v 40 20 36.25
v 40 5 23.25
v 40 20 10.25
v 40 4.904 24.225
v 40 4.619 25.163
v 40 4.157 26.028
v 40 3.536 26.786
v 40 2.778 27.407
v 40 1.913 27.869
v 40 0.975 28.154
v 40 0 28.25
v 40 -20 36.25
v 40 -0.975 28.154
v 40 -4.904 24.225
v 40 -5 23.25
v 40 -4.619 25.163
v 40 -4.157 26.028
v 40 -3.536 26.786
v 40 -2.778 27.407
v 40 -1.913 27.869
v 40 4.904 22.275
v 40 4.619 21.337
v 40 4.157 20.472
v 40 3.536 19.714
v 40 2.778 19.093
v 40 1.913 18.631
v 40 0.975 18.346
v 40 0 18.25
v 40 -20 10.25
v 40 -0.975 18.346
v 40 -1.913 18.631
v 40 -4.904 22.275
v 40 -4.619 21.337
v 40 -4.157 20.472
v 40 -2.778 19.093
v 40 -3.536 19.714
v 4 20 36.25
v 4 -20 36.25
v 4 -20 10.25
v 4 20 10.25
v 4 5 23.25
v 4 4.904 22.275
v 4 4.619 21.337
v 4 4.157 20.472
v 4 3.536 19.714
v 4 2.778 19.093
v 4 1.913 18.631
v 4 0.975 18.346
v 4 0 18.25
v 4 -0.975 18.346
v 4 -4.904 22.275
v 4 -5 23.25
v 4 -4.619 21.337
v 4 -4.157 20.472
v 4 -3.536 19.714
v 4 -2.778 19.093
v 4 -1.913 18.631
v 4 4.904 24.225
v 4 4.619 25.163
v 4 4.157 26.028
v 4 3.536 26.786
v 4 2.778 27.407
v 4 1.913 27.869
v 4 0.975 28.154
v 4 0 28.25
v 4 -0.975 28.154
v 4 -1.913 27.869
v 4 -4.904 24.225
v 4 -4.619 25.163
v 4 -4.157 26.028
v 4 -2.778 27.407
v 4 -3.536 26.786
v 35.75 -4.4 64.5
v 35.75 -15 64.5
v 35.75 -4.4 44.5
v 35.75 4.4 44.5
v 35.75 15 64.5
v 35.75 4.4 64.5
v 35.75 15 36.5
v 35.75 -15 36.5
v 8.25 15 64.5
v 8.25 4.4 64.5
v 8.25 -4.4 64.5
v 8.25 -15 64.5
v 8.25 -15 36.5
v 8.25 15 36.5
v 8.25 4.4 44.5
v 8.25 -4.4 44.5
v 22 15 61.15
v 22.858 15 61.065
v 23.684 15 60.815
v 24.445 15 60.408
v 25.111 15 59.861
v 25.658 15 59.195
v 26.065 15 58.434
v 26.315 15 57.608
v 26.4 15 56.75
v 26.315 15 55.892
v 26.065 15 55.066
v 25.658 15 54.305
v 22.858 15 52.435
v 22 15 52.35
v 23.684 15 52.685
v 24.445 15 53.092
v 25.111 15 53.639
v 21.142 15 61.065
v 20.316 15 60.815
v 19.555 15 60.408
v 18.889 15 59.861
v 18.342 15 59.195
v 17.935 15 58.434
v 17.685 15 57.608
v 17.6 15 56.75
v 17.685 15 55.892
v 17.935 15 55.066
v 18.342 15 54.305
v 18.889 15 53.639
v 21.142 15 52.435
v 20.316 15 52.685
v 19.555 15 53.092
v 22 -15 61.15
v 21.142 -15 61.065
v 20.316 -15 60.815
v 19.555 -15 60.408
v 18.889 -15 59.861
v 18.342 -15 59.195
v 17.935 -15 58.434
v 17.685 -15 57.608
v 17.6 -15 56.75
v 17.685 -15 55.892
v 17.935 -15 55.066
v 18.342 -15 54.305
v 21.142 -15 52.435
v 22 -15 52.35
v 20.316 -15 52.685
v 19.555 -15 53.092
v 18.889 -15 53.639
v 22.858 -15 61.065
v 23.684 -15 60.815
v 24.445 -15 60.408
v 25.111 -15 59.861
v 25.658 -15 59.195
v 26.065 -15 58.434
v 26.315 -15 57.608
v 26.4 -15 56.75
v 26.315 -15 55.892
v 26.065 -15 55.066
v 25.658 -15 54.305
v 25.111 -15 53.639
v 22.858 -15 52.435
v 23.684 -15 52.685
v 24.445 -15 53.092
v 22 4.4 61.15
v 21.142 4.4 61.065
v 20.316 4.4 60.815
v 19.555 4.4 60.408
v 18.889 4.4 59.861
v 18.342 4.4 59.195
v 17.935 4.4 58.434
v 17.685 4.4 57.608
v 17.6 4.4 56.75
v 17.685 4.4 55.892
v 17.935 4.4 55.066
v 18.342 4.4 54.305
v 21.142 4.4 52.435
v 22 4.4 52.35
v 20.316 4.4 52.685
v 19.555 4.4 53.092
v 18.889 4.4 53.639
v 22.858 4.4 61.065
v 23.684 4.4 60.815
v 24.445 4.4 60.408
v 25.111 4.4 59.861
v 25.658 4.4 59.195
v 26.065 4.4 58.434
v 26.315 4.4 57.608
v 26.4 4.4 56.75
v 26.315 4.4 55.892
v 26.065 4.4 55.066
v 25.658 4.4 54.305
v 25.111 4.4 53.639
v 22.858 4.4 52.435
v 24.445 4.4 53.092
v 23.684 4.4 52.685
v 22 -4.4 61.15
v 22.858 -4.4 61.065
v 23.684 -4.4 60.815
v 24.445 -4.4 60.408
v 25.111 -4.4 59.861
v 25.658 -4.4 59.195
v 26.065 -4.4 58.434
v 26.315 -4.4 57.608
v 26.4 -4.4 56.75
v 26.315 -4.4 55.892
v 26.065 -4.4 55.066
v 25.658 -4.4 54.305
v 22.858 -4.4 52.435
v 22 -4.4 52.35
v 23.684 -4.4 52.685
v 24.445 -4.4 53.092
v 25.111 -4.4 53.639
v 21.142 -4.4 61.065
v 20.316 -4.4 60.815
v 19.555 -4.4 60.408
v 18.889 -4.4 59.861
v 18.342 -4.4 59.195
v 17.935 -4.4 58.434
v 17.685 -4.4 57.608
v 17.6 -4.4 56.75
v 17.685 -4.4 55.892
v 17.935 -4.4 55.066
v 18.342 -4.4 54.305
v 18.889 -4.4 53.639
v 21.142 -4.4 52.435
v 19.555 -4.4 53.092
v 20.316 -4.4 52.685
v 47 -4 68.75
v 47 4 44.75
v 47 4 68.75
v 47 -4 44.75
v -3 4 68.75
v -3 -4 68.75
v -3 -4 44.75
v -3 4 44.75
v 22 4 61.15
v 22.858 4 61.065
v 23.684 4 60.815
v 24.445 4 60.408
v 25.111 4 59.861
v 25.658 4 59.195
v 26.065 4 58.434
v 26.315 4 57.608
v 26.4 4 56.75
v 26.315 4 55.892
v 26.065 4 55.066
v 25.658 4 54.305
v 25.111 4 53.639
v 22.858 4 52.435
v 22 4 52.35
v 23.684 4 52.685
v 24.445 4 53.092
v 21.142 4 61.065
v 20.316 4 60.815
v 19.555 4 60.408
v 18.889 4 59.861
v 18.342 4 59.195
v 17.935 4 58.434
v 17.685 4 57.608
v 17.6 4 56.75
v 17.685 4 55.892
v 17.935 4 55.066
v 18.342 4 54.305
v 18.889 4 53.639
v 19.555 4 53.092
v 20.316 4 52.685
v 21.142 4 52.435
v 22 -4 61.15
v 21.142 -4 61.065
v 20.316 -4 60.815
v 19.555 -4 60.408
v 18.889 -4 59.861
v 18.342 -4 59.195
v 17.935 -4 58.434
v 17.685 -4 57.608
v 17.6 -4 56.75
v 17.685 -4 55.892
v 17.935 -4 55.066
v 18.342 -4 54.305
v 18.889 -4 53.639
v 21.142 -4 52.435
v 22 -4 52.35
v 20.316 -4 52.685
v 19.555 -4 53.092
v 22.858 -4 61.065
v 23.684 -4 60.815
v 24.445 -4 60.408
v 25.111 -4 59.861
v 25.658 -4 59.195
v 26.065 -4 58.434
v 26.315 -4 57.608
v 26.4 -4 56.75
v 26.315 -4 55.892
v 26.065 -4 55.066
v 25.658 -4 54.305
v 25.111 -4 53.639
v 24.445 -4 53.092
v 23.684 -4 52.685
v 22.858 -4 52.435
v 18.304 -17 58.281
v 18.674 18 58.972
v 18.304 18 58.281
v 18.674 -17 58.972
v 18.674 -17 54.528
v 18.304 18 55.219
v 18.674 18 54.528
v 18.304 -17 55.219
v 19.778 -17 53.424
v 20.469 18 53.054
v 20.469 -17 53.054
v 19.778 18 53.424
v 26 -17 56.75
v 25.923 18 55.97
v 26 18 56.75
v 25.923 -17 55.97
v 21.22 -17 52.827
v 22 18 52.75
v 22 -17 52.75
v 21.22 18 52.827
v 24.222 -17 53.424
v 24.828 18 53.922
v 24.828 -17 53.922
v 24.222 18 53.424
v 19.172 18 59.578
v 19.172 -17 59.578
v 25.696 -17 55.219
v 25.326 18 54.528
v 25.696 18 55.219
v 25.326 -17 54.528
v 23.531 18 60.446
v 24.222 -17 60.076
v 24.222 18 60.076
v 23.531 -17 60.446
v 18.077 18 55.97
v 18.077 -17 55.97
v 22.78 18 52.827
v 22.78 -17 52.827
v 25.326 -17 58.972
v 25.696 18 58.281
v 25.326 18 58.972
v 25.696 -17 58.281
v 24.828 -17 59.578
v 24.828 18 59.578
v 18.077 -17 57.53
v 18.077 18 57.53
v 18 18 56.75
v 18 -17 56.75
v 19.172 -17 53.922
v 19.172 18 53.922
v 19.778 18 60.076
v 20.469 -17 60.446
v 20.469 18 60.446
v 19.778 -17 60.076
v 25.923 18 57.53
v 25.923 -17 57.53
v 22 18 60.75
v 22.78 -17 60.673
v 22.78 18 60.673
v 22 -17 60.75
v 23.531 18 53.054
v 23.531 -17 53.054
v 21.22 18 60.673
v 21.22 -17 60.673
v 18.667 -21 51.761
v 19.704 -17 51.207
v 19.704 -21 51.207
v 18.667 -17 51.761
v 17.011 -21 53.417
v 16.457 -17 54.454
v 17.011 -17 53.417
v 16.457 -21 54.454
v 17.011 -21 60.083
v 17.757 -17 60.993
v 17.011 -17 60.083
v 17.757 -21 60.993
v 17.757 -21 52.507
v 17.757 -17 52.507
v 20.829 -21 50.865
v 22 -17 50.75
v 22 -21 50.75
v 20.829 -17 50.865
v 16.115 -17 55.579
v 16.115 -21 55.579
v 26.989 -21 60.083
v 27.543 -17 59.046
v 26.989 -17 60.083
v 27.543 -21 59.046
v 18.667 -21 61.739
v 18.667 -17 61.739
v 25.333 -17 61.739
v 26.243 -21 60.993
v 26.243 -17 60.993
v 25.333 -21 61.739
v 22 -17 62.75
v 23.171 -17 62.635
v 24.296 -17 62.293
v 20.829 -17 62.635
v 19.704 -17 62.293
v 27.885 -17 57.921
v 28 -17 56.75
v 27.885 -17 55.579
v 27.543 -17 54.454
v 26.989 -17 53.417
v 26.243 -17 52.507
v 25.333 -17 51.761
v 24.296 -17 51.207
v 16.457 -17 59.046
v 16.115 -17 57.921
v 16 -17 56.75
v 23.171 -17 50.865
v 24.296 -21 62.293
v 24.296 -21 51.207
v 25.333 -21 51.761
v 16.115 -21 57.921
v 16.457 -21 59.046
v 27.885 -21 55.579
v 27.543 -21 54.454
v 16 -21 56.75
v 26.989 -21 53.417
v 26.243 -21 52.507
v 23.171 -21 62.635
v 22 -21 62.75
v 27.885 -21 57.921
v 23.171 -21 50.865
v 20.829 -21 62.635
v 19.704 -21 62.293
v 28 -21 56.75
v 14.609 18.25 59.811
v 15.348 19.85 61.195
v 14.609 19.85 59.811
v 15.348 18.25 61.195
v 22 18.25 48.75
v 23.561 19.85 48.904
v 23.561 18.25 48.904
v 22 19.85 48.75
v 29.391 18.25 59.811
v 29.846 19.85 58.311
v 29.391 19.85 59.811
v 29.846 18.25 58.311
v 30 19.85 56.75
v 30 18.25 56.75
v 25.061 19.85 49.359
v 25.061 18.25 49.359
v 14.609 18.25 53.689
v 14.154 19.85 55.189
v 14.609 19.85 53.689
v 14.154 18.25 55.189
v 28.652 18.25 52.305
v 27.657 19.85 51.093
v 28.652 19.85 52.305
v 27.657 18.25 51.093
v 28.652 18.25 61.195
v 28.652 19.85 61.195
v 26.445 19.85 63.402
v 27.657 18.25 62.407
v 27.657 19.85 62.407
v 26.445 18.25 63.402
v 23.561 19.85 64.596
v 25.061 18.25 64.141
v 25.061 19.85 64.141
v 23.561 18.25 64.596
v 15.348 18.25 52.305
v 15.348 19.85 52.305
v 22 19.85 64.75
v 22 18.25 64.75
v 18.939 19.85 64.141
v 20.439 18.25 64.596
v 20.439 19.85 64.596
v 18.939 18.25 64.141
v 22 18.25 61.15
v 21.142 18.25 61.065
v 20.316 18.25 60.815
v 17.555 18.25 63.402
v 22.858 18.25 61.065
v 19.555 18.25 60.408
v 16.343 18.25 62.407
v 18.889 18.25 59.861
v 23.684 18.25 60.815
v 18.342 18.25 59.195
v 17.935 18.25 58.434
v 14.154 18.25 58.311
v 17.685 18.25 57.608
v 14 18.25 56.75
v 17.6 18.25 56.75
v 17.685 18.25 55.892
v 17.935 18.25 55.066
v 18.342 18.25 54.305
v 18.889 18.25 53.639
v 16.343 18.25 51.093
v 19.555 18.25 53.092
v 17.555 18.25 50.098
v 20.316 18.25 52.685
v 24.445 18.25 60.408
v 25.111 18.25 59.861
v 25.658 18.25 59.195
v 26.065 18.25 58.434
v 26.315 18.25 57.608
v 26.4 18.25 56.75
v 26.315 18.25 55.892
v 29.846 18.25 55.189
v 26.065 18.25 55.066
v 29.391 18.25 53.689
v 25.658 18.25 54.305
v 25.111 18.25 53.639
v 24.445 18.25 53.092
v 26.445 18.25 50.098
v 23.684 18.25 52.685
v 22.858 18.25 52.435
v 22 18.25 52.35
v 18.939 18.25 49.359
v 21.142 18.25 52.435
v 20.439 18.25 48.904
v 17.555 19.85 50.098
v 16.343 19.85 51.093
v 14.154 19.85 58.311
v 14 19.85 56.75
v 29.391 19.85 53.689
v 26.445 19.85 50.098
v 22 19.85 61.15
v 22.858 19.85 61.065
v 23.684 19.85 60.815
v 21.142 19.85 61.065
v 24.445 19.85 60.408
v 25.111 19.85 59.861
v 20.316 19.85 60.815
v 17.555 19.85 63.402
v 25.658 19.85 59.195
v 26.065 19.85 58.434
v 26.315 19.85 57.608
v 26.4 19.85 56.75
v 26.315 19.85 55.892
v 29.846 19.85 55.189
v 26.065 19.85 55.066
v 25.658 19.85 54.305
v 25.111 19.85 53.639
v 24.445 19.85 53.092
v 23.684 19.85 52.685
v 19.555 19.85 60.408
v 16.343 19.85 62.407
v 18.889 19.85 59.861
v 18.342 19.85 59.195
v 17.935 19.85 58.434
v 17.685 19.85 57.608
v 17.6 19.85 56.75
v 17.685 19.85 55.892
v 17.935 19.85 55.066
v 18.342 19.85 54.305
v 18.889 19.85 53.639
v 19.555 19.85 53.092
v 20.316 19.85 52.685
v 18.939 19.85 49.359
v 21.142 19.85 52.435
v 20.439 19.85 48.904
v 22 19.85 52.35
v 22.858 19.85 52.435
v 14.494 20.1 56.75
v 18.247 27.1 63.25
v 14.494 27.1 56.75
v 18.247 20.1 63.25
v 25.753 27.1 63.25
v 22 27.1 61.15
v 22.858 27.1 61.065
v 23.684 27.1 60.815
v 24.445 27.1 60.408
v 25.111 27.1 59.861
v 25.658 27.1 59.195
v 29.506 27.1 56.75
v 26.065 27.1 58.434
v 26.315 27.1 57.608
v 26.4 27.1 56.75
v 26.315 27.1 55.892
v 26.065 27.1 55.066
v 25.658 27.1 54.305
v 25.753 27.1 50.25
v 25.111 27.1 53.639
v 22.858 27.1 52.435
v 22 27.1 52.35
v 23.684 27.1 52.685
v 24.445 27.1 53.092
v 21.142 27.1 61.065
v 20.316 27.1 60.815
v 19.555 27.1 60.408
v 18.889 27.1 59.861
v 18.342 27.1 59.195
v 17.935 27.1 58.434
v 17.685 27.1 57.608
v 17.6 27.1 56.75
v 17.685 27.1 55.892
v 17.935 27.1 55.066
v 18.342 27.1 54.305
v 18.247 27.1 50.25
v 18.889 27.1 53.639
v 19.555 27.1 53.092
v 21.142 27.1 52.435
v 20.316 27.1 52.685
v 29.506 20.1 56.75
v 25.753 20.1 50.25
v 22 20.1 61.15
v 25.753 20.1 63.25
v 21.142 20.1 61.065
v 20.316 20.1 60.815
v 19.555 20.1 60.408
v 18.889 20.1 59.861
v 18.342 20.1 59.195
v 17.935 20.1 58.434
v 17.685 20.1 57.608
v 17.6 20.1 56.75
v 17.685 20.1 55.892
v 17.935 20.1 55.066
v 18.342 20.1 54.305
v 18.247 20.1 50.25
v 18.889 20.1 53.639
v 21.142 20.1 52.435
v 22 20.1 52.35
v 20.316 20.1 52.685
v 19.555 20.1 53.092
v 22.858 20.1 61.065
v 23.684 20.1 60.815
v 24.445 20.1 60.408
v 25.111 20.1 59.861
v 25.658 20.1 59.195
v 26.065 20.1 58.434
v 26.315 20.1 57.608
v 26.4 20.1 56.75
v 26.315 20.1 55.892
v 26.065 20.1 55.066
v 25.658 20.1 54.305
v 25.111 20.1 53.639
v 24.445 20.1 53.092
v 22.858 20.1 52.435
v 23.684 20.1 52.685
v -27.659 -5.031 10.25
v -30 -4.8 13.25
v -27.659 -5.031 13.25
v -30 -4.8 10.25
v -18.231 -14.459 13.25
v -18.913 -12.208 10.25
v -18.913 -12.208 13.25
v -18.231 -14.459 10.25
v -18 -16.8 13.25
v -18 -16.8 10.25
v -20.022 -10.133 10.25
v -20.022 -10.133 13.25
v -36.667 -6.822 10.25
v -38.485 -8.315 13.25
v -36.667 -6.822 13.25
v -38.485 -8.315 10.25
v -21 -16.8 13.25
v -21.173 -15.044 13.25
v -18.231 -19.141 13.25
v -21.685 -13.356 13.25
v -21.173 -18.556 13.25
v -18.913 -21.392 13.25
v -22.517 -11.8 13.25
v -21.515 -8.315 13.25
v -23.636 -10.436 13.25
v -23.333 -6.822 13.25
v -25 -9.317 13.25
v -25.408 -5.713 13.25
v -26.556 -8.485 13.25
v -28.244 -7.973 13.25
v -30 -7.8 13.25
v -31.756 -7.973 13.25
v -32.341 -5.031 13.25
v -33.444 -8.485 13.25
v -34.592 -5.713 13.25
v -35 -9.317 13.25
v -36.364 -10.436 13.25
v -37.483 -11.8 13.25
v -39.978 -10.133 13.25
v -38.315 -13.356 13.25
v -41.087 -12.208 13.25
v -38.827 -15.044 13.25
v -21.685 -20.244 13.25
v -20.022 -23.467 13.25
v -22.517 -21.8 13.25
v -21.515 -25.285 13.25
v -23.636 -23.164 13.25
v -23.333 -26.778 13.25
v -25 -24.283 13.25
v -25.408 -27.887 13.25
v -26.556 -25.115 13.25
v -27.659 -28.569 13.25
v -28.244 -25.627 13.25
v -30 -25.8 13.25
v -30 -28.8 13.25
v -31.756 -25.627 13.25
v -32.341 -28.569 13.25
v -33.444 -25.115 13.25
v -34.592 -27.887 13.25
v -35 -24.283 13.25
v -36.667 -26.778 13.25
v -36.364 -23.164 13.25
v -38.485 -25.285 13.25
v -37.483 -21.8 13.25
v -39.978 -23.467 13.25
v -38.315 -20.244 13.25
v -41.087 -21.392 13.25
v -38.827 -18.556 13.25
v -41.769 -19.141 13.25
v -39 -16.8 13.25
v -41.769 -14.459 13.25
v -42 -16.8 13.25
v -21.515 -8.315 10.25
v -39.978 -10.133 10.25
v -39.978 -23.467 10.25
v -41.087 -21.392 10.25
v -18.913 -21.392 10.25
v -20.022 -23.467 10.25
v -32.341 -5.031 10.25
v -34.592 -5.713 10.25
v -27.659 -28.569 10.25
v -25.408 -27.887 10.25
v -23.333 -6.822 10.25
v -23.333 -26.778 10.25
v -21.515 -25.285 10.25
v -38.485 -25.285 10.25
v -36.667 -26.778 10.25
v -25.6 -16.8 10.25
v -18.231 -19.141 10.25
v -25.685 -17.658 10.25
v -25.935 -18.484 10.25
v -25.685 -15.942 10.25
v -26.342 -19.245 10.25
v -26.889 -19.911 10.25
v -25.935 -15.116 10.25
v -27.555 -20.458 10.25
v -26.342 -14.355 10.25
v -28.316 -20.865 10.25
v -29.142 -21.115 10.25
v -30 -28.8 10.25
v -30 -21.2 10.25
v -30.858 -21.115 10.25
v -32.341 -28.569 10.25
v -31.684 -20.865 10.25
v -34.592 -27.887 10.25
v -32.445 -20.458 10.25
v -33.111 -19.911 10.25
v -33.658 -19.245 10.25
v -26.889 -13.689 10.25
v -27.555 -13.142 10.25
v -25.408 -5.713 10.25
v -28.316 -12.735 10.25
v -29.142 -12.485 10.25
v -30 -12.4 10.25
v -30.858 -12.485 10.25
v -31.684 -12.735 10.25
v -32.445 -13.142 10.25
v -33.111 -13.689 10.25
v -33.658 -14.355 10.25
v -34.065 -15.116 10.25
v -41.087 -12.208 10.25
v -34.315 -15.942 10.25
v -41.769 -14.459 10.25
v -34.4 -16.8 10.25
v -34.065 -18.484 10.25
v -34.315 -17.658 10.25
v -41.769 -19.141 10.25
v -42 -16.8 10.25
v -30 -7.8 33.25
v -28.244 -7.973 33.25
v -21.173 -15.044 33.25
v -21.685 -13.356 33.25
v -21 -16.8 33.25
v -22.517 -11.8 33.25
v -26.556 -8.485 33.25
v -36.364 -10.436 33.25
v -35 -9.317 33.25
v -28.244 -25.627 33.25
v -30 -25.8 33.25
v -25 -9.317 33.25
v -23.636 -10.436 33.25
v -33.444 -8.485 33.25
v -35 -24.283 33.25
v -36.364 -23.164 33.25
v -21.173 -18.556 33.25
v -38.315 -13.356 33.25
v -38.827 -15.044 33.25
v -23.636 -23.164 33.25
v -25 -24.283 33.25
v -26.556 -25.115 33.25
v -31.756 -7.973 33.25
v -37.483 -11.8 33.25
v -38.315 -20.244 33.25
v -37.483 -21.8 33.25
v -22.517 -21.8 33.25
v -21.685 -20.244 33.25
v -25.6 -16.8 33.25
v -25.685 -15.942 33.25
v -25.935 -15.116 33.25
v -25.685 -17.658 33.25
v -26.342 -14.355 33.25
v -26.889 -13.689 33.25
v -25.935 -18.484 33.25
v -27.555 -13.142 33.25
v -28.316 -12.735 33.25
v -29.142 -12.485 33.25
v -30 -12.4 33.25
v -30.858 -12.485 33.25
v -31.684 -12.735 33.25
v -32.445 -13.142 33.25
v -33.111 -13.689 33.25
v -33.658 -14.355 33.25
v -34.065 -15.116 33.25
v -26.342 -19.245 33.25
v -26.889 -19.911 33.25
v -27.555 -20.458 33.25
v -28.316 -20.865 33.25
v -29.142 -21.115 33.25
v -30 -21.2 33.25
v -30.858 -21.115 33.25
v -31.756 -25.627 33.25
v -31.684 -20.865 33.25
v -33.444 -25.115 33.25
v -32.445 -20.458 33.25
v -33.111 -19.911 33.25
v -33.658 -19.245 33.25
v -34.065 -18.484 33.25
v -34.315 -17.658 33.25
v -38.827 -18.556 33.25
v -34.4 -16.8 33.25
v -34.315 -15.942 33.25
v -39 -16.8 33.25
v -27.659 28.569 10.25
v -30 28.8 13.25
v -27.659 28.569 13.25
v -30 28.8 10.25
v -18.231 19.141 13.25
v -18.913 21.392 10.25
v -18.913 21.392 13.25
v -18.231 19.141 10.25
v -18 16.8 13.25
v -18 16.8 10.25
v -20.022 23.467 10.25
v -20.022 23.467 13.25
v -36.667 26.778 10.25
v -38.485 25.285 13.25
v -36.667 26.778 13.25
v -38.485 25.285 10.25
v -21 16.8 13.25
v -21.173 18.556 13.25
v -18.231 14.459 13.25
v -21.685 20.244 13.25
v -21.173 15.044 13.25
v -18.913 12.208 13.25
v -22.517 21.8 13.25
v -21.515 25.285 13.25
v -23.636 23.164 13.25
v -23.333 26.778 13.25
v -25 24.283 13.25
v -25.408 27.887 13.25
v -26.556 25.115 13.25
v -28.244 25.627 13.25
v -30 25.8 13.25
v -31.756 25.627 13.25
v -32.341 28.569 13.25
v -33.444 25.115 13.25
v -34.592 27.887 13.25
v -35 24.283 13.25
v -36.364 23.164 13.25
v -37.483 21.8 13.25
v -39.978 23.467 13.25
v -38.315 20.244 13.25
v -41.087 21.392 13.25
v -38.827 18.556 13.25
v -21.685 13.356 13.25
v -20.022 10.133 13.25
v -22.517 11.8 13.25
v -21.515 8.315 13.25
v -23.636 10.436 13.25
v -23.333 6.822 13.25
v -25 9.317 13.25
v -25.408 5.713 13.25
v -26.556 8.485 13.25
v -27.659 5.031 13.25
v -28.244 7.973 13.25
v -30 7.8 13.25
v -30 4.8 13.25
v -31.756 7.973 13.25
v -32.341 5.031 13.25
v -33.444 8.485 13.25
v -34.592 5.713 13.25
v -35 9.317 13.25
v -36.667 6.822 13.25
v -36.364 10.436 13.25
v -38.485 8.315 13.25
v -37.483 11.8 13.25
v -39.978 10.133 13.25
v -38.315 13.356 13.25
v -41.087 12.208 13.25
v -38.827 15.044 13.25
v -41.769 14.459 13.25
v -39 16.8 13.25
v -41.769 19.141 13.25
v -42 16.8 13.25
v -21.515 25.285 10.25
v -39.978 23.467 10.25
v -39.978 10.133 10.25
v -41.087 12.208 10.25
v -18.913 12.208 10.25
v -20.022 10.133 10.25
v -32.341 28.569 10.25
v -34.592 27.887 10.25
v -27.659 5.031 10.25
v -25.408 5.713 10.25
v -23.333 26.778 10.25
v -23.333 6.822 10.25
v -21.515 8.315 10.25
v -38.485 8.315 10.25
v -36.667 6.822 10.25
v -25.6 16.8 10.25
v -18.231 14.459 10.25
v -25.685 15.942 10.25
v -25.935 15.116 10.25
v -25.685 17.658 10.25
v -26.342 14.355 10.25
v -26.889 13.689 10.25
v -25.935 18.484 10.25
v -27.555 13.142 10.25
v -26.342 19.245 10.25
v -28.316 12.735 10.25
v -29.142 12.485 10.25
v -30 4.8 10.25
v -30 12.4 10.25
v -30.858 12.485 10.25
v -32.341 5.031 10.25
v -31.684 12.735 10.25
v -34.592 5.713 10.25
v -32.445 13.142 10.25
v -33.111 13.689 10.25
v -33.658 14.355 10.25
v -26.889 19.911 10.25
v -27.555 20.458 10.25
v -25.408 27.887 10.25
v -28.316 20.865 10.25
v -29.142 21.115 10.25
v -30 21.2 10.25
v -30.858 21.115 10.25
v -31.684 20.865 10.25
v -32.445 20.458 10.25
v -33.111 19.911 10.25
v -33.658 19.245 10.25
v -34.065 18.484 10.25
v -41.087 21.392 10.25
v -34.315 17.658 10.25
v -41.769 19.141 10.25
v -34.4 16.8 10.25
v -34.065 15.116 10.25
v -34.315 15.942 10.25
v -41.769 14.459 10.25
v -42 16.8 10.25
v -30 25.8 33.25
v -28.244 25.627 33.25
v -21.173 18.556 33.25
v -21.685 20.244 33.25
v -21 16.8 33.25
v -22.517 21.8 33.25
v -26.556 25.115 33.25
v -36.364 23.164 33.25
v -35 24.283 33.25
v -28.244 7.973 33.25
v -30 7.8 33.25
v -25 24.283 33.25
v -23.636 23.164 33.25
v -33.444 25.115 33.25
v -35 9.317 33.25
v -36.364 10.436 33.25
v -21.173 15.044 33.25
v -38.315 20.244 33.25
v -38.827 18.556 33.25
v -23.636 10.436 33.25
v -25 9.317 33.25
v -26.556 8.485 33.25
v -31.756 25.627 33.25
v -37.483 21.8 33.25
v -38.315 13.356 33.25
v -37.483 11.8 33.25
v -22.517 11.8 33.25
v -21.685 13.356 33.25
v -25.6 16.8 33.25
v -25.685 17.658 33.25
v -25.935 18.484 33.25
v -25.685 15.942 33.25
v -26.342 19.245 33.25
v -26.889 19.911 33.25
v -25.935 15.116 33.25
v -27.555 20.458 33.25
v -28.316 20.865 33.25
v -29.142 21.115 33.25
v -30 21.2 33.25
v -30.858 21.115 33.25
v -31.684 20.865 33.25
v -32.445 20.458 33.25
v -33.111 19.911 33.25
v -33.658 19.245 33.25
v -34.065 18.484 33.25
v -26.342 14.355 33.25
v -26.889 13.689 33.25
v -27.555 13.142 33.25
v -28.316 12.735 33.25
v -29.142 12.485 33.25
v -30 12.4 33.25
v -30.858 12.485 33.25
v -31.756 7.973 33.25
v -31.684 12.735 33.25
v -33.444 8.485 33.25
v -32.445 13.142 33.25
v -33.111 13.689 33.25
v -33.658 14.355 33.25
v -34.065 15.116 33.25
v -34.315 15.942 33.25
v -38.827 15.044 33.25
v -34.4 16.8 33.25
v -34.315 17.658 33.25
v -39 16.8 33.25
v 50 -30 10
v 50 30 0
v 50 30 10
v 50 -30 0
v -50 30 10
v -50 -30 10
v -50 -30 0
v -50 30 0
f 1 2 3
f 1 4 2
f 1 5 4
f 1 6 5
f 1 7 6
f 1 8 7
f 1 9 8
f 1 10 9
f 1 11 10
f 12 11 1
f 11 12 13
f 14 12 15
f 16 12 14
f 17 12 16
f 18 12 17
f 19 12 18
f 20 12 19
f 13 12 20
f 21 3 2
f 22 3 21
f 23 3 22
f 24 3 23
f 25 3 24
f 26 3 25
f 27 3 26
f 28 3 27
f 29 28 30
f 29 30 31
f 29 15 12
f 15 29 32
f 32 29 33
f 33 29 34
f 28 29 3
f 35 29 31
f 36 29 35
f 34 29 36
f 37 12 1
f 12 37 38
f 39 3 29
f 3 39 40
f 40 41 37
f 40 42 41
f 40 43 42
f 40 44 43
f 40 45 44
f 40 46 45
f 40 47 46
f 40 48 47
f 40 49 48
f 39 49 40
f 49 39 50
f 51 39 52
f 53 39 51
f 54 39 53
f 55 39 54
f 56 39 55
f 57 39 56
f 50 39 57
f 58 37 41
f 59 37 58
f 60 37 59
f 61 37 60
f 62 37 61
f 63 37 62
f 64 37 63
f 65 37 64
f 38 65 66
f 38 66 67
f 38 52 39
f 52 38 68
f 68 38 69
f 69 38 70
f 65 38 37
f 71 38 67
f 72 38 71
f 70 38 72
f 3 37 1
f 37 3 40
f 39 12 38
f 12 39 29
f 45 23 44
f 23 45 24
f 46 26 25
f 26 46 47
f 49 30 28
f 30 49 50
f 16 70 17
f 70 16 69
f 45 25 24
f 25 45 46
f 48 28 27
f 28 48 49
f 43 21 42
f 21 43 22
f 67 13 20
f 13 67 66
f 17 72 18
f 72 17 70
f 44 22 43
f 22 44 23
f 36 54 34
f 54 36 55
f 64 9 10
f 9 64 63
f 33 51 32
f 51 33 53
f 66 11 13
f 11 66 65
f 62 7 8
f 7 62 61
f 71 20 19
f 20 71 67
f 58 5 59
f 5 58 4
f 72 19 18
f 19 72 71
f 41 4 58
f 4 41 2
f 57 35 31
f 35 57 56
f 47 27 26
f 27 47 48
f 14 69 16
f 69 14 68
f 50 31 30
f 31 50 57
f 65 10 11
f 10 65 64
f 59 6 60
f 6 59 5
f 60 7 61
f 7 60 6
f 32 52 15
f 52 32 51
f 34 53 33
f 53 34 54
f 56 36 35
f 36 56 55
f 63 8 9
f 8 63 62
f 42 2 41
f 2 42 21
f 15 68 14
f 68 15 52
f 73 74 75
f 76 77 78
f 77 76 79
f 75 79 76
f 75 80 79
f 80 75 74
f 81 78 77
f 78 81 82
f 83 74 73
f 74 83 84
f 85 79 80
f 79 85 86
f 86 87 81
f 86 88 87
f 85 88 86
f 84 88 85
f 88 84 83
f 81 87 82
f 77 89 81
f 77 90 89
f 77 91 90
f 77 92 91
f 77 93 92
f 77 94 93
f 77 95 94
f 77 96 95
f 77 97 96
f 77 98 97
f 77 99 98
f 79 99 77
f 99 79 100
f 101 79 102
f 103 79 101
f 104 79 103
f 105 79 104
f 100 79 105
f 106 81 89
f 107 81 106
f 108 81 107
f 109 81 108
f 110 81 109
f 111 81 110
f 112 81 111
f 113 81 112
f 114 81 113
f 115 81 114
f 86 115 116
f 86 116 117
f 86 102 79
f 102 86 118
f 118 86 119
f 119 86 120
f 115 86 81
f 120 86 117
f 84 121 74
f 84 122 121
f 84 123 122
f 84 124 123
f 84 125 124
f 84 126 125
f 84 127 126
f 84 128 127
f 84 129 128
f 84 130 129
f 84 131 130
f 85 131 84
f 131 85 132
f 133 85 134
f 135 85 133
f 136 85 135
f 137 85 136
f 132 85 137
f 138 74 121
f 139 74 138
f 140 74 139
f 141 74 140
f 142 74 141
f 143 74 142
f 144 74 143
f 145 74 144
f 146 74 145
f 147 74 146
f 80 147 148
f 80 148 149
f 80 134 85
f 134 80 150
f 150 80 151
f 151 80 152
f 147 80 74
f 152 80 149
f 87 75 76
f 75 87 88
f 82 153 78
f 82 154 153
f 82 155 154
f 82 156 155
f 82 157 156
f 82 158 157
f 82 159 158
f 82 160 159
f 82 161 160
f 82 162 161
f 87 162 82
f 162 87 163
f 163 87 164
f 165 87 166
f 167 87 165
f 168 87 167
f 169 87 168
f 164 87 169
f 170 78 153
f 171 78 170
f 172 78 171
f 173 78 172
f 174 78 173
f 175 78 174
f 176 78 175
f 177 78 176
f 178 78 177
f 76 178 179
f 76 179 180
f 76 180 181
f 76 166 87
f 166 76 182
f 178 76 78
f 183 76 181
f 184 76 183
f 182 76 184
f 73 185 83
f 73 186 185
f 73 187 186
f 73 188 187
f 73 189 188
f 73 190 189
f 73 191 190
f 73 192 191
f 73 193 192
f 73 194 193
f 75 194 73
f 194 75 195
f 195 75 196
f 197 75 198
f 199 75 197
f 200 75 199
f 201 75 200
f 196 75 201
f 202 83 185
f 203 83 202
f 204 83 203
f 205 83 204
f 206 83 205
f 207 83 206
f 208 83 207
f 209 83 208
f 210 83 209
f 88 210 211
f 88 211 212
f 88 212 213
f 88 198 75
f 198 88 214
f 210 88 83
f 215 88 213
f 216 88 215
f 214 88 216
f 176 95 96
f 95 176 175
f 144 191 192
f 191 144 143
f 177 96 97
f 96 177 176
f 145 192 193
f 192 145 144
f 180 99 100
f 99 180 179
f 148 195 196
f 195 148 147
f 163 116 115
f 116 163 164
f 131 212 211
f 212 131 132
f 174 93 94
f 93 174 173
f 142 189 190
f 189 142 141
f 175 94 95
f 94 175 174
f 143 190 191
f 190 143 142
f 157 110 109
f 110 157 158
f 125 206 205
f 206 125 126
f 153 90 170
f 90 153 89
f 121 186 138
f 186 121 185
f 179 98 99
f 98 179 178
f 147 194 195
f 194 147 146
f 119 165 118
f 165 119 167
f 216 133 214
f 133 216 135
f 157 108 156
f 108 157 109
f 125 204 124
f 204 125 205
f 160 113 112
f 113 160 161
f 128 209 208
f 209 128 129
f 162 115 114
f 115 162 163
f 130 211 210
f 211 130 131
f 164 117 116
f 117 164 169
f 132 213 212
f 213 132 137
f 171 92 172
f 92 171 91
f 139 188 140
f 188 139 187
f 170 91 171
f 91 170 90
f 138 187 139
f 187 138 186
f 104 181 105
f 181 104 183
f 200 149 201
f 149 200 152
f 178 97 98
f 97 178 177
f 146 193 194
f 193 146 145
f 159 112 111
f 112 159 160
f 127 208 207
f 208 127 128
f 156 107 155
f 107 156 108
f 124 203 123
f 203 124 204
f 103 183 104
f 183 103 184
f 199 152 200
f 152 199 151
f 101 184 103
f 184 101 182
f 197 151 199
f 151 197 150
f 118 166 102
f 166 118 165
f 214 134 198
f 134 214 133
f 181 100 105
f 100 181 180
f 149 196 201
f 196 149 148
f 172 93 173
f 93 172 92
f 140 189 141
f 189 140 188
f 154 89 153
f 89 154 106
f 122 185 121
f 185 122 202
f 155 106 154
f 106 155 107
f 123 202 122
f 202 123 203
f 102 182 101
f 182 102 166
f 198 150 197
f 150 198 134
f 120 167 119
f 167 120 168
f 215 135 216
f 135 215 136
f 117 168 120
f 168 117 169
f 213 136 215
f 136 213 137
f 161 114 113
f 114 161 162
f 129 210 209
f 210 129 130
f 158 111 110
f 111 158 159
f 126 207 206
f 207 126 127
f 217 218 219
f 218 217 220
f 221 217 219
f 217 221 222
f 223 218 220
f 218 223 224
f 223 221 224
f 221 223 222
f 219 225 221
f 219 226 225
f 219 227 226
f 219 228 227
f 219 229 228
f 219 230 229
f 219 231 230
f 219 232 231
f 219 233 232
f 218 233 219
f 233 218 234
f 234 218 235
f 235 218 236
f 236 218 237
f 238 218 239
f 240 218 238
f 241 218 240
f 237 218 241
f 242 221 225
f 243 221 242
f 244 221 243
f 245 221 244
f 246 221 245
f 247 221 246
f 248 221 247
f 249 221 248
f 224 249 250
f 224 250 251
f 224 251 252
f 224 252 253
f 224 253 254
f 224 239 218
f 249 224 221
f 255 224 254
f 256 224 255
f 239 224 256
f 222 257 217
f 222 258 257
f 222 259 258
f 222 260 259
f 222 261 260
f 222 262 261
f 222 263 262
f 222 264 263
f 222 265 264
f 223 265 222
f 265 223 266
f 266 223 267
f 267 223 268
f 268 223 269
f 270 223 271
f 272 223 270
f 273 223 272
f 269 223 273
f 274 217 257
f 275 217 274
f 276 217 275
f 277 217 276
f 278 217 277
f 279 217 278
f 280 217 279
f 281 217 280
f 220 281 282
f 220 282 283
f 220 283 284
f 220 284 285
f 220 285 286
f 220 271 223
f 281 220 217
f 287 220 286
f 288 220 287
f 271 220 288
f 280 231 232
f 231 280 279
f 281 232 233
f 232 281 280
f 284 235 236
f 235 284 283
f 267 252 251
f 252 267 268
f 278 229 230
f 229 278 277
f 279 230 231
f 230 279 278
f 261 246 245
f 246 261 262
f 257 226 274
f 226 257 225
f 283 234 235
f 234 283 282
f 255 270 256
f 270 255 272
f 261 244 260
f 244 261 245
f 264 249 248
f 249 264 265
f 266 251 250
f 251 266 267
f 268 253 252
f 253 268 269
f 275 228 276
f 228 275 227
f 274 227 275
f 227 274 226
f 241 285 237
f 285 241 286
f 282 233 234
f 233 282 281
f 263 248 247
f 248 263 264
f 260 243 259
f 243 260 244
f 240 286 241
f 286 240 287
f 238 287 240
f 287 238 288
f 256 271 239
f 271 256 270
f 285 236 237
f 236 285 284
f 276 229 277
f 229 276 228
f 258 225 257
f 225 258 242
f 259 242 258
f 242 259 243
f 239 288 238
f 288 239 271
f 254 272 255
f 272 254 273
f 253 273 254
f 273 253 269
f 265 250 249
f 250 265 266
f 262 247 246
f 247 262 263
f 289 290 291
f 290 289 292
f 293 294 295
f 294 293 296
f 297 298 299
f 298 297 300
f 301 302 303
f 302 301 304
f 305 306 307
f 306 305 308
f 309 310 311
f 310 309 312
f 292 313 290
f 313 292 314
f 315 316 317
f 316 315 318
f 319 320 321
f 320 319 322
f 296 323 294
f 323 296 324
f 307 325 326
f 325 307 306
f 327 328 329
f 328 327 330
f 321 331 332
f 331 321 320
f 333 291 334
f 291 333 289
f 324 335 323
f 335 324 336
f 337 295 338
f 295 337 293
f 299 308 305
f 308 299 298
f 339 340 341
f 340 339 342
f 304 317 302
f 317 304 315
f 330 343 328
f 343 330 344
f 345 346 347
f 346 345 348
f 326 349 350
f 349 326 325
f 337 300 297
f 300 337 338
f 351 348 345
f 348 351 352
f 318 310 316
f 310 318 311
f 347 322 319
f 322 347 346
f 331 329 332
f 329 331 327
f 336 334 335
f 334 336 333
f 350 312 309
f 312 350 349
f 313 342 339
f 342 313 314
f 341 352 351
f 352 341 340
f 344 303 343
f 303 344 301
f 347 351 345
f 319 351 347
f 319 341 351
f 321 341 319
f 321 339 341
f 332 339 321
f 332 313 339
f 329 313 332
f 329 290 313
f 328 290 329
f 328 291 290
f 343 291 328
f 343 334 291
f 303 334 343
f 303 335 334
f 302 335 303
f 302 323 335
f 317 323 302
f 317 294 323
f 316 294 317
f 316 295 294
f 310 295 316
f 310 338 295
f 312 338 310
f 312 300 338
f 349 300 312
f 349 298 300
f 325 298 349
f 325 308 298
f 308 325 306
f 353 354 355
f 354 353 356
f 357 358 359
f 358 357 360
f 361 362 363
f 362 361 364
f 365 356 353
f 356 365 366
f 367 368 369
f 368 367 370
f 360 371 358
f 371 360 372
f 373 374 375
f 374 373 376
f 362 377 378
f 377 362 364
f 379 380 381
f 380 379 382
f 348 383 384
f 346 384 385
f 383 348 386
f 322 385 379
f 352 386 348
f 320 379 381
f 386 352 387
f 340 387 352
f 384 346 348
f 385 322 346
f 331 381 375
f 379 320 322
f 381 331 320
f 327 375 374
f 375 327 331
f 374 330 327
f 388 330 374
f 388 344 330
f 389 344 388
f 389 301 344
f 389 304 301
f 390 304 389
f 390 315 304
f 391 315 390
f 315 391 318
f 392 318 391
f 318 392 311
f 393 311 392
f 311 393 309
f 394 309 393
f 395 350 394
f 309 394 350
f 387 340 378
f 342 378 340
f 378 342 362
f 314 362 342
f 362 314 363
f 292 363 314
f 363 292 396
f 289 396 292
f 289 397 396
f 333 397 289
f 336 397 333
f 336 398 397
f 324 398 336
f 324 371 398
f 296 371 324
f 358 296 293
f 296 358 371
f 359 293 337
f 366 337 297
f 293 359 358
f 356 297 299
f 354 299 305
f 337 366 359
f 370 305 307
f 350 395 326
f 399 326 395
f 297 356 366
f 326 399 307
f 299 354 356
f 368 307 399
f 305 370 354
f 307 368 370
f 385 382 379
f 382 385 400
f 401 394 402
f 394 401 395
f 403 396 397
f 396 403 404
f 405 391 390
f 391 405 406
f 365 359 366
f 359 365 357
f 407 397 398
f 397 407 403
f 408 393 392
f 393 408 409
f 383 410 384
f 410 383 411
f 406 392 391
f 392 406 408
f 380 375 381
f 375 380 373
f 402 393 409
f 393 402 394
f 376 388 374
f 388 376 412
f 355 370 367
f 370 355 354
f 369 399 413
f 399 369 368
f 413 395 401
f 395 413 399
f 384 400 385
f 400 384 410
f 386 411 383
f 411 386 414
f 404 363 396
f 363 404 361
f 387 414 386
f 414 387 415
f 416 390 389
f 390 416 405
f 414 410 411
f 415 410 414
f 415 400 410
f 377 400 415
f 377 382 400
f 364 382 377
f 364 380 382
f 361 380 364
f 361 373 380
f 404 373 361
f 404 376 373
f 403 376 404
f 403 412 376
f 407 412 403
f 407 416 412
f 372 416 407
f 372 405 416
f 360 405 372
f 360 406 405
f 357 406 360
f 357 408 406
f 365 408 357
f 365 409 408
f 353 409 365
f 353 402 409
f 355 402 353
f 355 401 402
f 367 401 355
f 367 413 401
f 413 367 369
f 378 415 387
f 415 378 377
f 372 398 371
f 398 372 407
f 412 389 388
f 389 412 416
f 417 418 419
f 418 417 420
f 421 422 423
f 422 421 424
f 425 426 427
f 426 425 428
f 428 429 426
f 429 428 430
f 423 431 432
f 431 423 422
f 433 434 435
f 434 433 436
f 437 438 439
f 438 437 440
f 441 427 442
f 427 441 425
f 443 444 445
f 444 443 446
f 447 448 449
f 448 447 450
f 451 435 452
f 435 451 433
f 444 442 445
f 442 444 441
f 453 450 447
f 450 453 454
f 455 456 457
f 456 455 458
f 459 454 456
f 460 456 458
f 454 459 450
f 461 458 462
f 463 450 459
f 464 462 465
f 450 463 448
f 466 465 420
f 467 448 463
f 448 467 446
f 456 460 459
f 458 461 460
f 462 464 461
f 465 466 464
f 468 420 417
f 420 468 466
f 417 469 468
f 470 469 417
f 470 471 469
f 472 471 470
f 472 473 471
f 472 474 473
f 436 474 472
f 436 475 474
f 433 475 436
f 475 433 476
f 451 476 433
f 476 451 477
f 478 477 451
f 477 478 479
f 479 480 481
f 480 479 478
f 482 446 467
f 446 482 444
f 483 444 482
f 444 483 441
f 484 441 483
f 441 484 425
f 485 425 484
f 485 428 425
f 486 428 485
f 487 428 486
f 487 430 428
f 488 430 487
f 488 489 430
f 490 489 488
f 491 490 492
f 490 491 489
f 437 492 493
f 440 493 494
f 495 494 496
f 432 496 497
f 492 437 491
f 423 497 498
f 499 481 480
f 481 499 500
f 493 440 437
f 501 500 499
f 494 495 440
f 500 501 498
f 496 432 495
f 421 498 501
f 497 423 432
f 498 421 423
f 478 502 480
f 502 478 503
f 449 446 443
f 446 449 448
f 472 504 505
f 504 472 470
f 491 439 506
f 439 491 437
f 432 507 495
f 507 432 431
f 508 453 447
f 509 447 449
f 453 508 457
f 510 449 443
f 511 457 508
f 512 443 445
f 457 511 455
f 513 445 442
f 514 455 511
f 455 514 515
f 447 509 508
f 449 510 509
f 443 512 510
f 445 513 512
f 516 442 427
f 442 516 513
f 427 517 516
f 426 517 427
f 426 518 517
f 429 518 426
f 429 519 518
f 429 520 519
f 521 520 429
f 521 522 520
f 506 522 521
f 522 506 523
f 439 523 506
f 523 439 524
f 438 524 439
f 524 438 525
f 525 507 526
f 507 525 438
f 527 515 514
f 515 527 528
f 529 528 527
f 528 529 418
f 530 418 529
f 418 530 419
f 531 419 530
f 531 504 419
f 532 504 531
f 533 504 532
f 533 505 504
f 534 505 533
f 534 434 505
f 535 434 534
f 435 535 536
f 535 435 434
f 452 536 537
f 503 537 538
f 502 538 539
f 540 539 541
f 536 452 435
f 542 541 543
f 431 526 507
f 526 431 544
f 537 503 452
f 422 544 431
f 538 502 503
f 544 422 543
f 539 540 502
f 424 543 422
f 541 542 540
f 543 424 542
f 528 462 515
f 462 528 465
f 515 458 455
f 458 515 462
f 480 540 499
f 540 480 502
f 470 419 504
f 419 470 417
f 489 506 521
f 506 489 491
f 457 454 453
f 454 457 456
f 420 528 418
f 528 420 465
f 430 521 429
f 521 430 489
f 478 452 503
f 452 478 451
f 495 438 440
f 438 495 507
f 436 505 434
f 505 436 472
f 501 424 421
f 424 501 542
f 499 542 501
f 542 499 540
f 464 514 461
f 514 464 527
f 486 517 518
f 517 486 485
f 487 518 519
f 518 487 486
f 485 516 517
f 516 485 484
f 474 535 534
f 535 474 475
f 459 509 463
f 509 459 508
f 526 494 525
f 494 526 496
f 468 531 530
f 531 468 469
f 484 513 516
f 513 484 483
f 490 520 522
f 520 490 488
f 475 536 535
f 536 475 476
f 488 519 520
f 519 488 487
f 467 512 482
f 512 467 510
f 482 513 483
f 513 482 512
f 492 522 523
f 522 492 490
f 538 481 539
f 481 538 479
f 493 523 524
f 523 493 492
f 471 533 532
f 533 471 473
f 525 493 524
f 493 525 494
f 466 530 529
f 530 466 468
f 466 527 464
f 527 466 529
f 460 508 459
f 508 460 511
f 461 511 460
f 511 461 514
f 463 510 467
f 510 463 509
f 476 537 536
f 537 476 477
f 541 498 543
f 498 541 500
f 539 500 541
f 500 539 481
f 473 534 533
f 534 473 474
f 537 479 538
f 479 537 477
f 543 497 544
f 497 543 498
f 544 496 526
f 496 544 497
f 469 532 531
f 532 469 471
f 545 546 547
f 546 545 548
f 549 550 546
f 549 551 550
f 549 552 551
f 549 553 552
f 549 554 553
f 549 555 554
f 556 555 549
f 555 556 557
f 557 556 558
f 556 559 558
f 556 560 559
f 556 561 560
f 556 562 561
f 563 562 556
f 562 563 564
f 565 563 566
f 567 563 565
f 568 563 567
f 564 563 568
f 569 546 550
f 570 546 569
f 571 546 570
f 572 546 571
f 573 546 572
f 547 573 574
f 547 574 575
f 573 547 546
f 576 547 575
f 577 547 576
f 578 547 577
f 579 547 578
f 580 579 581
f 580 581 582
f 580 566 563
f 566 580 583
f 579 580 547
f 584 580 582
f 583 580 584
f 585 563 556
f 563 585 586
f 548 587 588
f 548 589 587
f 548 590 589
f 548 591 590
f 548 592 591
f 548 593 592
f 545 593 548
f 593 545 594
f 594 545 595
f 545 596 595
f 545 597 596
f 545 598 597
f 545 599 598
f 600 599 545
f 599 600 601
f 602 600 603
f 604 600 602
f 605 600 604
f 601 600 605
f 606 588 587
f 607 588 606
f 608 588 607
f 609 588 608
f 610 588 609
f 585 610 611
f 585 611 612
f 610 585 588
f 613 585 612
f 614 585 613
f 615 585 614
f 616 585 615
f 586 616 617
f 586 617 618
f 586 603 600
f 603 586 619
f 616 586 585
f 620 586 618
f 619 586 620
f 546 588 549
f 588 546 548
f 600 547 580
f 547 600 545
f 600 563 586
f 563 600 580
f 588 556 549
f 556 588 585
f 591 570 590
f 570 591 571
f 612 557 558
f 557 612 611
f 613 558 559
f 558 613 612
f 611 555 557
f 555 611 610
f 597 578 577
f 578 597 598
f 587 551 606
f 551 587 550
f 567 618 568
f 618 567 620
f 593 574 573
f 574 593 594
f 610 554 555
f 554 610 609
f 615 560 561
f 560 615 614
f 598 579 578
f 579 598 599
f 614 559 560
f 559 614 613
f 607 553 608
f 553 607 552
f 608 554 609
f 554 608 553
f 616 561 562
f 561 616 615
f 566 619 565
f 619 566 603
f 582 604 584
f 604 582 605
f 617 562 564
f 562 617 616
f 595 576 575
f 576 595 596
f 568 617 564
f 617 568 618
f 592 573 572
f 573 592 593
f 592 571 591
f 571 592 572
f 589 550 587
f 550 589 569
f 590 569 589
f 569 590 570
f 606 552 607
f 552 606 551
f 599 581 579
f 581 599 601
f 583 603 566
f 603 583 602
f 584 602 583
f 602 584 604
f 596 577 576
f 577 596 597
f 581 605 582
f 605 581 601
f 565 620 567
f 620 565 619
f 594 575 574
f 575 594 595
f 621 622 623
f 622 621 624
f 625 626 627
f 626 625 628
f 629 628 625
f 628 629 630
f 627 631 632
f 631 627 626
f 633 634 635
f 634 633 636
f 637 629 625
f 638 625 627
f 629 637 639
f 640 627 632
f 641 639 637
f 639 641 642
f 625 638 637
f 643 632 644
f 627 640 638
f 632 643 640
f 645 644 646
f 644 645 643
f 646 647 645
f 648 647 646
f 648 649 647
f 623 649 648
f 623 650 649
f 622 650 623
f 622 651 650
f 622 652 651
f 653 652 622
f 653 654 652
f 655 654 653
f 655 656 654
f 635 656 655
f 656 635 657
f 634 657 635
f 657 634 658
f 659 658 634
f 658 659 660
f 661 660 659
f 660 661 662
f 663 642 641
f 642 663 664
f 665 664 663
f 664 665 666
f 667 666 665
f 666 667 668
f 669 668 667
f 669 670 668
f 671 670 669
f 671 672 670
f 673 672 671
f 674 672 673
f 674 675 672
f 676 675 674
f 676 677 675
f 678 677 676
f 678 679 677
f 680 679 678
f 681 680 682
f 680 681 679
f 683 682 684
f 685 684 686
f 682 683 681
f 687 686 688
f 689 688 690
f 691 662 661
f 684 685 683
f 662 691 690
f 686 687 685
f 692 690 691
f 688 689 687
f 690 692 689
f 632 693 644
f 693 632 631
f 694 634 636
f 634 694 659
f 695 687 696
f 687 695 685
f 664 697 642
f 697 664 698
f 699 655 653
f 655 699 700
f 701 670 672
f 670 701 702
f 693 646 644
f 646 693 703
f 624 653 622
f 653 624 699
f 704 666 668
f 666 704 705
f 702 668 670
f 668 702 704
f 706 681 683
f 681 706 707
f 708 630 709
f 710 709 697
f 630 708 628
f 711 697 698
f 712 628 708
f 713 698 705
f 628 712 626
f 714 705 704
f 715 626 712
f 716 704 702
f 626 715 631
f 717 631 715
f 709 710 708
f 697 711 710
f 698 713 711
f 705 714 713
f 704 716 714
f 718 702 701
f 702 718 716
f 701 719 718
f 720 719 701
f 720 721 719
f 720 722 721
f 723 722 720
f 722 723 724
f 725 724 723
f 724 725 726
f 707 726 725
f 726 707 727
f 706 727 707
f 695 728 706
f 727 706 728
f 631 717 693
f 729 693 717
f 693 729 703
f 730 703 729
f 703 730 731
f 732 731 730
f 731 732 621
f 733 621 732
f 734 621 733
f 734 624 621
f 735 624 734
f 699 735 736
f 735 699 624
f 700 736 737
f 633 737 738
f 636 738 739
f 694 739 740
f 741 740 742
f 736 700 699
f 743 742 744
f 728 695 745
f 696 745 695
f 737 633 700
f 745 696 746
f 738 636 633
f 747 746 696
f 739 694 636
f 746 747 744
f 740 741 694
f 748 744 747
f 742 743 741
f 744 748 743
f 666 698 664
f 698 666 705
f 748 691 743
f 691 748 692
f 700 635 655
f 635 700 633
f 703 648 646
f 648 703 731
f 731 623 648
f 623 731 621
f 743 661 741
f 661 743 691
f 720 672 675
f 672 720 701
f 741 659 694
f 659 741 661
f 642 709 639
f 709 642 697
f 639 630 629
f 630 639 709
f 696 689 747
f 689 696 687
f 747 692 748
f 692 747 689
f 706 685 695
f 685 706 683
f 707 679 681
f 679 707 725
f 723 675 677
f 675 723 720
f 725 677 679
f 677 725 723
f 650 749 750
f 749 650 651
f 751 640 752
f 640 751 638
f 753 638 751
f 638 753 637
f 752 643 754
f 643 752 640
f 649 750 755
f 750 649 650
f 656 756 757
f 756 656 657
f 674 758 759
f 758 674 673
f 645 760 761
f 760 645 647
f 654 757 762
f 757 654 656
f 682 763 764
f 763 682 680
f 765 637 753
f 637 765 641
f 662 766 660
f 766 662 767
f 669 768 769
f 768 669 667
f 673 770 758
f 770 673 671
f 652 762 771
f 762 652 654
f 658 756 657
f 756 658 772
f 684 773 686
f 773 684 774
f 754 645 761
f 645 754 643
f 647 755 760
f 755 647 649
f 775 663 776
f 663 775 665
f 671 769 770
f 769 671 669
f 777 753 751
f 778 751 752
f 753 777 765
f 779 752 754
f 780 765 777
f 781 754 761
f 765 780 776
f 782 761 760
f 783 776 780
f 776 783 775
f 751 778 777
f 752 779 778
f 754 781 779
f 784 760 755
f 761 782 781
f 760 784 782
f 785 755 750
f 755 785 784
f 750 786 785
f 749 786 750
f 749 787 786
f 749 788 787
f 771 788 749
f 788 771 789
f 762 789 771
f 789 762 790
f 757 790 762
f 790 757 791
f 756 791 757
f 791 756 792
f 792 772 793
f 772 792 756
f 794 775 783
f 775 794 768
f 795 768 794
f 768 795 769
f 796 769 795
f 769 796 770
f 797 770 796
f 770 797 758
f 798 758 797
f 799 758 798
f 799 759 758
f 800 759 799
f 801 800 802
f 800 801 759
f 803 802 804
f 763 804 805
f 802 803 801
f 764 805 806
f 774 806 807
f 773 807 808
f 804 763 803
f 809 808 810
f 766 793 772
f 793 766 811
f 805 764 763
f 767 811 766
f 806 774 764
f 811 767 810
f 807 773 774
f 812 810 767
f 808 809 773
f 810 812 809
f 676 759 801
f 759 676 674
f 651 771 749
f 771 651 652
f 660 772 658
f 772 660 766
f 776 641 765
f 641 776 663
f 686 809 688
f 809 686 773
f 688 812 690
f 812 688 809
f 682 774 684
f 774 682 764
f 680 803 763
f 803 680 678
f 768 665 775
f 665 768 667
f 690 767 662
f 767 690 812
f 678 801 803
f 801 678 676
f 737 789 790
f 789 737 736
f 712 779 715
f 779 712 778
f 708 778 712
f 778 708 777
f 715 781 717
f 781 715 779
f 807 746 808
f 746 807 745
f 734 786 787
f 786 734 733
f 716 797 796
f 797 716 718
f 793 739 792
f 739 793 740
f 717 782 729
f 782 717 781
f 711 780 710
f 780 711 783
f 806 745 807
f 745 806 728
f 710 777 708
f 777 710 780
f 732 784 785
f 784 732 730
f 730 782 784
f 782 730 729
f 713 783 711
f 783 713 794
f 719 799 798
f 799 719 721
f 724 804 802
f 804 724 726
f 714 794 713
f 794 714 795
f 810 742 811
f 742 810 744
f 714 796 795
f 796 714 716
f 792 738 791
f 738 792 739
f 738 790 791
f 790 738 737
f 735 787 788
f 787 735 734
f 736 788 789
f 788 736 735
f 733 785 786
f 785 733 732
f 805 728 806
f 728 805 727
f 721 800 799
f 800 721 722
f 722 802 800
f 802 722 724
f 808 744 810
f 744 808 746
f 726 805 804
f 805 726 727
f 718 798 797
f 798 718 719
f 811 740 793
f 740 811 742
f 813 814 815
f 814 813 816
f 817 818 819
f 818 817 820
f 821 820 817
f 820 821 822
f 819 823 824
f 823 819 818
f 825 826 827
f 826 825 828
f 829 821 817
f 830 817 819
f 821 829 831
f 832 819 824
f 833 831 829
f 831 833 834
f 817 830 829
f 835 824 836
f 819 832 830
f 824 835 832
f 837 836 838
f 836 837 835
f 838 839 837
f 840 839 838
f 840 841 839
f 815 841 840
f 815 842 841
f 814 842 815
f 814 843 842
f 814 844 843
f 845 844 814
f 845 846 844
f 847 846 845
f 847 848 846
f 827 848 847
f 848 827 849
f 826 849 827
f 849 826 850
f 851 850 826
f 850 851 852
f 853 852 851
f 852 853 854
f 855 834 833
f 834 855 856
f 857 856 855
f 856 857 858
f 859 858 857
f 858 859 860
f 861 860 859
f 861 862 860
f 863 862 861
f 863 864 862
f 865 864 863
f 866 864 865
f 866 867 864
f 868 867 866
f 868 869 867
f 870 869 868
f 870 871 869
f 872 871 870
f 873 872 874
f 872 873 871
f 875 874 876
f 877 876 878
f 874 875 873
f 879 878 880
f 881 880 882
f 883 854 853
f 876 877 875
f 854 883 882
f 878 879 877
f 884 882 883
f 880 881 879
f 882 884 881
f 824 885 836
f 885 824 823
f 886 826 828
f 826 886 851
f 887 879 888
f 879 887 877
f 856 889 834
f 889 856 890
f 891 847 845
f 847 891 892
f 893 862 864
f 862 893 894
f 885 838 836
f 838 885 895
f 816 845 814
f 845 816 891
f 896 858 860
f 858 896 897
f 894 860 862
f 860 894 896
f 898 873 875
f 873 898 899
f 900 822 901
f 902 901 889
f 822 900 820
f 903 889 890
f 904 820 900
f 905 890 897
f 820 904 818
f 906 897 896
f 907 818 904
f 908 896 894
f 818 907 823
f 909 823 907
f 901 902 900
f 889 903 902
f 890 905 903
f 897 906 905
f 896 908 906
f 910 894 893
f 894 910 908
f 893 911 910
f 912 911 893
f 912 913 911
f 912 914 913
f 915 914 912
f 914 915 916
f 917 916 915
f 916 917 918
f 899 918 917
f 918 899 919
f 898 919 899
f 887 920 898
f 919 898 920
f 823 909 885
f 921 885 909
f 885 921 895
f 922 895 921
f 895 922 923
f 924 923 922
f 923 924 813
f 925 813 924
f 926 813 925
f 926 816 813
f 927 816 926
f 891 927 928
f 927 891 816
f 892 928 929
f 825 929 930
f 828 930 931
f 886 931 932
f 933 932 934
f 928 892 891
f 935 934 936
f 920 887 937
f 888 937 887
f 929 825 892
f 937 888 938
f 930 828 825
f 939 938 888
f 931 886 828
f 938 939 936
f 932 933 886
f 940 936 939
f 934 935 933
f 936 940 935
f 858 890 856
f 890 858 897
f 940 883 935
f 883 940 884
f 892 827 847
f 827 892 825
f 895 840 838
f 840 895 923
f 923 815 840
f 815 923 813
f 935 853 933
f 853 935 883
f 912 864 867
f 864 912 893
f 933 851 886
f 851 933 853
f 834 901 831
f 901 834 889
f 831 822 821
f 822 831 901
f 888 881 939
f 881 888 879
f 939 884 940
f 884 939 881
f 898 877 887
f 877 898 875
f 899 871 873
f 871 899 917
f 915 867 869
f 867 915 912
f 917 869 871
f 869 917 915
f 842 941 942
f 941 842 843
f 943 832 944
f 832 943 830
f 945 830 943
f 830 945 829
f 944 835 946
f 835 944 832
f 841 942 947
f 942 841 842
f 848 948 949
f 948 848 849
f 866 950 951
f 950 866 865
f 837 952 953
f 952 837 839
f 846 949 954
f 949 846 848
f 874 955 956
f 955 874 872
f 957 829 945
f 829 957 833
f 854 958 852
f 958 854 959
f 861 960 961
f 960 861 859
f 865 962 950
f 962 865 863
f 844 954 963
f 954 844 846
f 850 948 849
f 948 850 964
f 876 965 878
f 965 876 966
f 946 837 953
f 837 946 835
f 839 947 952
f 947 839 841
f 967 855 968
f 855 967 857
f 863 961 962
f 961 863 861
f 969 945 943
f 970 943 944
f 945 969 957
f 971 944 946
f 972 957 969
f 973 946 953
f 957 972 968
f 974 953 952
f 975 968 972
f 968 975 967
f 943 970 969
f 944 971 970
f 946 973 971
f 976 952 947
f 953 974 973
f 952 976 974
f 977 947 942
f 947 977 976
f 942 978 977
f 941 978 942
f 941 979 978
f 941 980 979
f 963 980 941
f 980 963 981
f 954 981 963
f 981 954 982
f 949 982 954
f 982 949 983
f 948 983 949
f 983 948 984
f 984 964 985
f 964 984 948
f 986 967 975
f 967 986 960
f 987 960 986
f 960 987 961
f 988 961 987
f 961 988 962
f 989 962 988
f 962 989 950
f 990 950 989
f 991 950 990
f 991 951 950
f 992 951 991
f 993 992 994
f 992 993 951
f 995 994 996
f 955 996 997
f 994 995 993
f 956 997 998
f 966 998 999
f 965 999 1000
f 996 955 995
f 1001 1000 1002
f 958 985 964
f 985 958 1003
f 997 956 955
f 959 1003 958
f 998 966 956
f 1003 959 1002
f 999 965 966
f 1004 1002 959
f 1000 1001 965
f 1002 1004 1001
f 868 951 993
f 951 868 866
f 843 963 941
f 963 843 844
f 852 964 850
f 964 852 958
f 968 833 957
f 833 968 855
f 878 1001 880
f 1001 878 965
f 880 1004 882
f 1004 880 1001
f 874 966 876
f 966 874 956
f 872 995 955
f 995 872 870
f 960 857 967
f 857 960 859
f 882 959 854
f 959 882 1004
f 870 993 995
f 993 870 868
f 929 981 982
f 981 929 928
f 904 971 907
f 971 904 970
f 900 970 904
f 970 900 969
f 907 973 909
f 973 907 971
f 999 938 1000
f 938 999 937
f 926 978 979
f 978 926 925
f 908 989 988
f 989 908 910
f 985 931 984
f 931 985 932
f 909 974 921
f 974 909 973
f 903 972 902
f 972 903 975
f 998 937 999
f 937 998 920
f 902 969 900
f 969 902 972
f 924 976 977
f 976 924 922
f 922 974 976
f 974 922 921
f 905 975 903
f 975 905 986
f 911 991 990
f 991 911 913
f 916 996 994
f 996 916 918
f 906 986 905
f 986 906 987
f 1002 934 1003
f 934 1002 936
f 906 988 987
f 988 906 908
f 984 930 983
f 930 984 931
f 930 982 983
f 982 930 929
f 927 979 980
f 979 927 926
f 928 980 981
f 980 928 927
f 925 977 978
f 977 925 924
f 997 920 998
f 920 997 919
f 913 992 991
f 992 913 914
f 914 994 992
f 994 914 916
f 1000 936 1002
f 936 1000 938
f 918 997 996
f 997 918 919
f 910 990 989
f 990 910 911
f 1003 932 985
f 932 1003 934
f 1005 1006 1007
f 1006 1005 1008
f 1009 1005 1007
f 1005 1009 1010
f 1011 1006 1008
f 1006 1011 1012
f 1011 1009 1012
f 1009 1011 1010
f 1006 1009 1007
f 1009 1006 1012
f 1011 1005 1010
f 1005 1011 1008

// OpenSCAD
$fn = 32;

// ------------------------------------------------------------------------
// Indexing jig: plate 100 x 60 mm, pin d8
// Every part is its own module, assembly() places every instance.
// ------------------------------------------------------------------------

// --- part 1 ---
module jig_plate() {
  difference() {
    translate([-50, -30, 0]) cube([100, 60, 10]);
  }
}

// --- part 2 ---
module locator_block() {
  difference() {
    translate([-18, -20, 0]) cube([36, 40, 26]);
    translate([0, 0, 13]) rotate([0, 90, 0]) cylinder(h = 38, d = 10, center = true);
  }
}

// --- part 3 ---
module index_fork() {
  difference() {
    translate([-13.75, -15, 0]) cube([27.5, 30, 28]);
    translate([-14.75, -4.4, 8]) cube([29.5, 8.8, 21]);
    translate([0, 0, 20.25]) rotate([90, 0, 0]) cylinder(h = 32, d = 8.8, center = true);
  }
}

// --- part 4 ---
module index_arm() {
  difference() {
    translate([-25, -4, 0]) cube([50, 8, 24]);
    translate([0, 0, 12]) rotate([90, 0, 0]) cylinder(h = 10, d = 8.8, center = true);
  }
}

// --- part 5 ---
module index_pin() {
  rotate([0, 90, 0]) cylinder(h = 36, d = 8, center = true);
  translate([-21, 0, 0]) rotate([0, 90, 0]) cylinder(h = 4, d = 12);
}

// --- part 6 ---
module pin_washer() {
  difference() {
      translate([0, 0, 0]) cylinder(h = 1.6, d = 16);
      translate([0, 0, -1]) cylinder(h = 3.6, d = 8.8);
    }
}

// --- part 7 ---
module lock_nut() {
  difference() {
    linear_extrude(height = 7) polygon(points = [[7.506, 0], [3.753, 6.5], [-3.753, 6.5], [-7.506, 0], [-3.753, -6.5], [3.753, -6.5]]);
    translate([0, 0, -1]) cylinder(h = 9, d = 8.8);
  }
}

// --- part 8 ---
module guide_bush_a() {
  difference() {
    union() {
      cylinder(h = 3, d = 24);
      translate([0, 0, 3]) cylinder(h = 20, d = 18);
    }
    translate([0, 0, -1]) cylinder(h = 25, d = 8.8);
  }
}

// --- part 9 ---
module guide_bush_b() {
  difference() {
    union() {
      cylinder(h = 3, d = 24);
      translate([0, 0, 3]) cylinder(h = 20, d = 18);
    }
    translate([0, 0, -1]) cylinder(h = 25, d = 8.8);
  }
}

// --- assembly ---
module assembly() {
  color([0.80, 0.24, 0.20]) translate([0, 0, 0]) rotate([0, 0, 0]) jig_plate();
  color([0.20, 0.45, 0.75]) translate([22, 0, 10.25]) rotate([0, 0, 0]) locator_block();
  color([0.25, 0.62, 0.32]) translate([22, 0, 36.5]) rotate([0, 0, 0]) index_fork();
  color([0.92, 0.70, 0.18]) translate([22, 0, 44.75]) rotate([0, 0, 0]) index_arm();
  color([0.58, 0.35, 0.70]) translate([22, 0, 56.75]) rotate([0, 0, 90]) index_pin();
  color([0.16, 0.66, 0.66]) translate([22, 19.85, 56.75]) rotate([90, 0, 0]) pin_washer();
  color([0.85, 0.48, 0.18]) translate([22, 27.1, 56.75]) rotate([90, 0, 0]) lock_nut();
  color([0.55, 0.60, 0.65]) translate([-30, -16.8, 10.25]) rotate([0, 0, 0]) guide_bush_a();
  color([0.75, 0.30, 0.55]) translate([-30, 16.8, 10.25]) rotate([0, 0, 0]) guide_bush_b();
}

assembly();
